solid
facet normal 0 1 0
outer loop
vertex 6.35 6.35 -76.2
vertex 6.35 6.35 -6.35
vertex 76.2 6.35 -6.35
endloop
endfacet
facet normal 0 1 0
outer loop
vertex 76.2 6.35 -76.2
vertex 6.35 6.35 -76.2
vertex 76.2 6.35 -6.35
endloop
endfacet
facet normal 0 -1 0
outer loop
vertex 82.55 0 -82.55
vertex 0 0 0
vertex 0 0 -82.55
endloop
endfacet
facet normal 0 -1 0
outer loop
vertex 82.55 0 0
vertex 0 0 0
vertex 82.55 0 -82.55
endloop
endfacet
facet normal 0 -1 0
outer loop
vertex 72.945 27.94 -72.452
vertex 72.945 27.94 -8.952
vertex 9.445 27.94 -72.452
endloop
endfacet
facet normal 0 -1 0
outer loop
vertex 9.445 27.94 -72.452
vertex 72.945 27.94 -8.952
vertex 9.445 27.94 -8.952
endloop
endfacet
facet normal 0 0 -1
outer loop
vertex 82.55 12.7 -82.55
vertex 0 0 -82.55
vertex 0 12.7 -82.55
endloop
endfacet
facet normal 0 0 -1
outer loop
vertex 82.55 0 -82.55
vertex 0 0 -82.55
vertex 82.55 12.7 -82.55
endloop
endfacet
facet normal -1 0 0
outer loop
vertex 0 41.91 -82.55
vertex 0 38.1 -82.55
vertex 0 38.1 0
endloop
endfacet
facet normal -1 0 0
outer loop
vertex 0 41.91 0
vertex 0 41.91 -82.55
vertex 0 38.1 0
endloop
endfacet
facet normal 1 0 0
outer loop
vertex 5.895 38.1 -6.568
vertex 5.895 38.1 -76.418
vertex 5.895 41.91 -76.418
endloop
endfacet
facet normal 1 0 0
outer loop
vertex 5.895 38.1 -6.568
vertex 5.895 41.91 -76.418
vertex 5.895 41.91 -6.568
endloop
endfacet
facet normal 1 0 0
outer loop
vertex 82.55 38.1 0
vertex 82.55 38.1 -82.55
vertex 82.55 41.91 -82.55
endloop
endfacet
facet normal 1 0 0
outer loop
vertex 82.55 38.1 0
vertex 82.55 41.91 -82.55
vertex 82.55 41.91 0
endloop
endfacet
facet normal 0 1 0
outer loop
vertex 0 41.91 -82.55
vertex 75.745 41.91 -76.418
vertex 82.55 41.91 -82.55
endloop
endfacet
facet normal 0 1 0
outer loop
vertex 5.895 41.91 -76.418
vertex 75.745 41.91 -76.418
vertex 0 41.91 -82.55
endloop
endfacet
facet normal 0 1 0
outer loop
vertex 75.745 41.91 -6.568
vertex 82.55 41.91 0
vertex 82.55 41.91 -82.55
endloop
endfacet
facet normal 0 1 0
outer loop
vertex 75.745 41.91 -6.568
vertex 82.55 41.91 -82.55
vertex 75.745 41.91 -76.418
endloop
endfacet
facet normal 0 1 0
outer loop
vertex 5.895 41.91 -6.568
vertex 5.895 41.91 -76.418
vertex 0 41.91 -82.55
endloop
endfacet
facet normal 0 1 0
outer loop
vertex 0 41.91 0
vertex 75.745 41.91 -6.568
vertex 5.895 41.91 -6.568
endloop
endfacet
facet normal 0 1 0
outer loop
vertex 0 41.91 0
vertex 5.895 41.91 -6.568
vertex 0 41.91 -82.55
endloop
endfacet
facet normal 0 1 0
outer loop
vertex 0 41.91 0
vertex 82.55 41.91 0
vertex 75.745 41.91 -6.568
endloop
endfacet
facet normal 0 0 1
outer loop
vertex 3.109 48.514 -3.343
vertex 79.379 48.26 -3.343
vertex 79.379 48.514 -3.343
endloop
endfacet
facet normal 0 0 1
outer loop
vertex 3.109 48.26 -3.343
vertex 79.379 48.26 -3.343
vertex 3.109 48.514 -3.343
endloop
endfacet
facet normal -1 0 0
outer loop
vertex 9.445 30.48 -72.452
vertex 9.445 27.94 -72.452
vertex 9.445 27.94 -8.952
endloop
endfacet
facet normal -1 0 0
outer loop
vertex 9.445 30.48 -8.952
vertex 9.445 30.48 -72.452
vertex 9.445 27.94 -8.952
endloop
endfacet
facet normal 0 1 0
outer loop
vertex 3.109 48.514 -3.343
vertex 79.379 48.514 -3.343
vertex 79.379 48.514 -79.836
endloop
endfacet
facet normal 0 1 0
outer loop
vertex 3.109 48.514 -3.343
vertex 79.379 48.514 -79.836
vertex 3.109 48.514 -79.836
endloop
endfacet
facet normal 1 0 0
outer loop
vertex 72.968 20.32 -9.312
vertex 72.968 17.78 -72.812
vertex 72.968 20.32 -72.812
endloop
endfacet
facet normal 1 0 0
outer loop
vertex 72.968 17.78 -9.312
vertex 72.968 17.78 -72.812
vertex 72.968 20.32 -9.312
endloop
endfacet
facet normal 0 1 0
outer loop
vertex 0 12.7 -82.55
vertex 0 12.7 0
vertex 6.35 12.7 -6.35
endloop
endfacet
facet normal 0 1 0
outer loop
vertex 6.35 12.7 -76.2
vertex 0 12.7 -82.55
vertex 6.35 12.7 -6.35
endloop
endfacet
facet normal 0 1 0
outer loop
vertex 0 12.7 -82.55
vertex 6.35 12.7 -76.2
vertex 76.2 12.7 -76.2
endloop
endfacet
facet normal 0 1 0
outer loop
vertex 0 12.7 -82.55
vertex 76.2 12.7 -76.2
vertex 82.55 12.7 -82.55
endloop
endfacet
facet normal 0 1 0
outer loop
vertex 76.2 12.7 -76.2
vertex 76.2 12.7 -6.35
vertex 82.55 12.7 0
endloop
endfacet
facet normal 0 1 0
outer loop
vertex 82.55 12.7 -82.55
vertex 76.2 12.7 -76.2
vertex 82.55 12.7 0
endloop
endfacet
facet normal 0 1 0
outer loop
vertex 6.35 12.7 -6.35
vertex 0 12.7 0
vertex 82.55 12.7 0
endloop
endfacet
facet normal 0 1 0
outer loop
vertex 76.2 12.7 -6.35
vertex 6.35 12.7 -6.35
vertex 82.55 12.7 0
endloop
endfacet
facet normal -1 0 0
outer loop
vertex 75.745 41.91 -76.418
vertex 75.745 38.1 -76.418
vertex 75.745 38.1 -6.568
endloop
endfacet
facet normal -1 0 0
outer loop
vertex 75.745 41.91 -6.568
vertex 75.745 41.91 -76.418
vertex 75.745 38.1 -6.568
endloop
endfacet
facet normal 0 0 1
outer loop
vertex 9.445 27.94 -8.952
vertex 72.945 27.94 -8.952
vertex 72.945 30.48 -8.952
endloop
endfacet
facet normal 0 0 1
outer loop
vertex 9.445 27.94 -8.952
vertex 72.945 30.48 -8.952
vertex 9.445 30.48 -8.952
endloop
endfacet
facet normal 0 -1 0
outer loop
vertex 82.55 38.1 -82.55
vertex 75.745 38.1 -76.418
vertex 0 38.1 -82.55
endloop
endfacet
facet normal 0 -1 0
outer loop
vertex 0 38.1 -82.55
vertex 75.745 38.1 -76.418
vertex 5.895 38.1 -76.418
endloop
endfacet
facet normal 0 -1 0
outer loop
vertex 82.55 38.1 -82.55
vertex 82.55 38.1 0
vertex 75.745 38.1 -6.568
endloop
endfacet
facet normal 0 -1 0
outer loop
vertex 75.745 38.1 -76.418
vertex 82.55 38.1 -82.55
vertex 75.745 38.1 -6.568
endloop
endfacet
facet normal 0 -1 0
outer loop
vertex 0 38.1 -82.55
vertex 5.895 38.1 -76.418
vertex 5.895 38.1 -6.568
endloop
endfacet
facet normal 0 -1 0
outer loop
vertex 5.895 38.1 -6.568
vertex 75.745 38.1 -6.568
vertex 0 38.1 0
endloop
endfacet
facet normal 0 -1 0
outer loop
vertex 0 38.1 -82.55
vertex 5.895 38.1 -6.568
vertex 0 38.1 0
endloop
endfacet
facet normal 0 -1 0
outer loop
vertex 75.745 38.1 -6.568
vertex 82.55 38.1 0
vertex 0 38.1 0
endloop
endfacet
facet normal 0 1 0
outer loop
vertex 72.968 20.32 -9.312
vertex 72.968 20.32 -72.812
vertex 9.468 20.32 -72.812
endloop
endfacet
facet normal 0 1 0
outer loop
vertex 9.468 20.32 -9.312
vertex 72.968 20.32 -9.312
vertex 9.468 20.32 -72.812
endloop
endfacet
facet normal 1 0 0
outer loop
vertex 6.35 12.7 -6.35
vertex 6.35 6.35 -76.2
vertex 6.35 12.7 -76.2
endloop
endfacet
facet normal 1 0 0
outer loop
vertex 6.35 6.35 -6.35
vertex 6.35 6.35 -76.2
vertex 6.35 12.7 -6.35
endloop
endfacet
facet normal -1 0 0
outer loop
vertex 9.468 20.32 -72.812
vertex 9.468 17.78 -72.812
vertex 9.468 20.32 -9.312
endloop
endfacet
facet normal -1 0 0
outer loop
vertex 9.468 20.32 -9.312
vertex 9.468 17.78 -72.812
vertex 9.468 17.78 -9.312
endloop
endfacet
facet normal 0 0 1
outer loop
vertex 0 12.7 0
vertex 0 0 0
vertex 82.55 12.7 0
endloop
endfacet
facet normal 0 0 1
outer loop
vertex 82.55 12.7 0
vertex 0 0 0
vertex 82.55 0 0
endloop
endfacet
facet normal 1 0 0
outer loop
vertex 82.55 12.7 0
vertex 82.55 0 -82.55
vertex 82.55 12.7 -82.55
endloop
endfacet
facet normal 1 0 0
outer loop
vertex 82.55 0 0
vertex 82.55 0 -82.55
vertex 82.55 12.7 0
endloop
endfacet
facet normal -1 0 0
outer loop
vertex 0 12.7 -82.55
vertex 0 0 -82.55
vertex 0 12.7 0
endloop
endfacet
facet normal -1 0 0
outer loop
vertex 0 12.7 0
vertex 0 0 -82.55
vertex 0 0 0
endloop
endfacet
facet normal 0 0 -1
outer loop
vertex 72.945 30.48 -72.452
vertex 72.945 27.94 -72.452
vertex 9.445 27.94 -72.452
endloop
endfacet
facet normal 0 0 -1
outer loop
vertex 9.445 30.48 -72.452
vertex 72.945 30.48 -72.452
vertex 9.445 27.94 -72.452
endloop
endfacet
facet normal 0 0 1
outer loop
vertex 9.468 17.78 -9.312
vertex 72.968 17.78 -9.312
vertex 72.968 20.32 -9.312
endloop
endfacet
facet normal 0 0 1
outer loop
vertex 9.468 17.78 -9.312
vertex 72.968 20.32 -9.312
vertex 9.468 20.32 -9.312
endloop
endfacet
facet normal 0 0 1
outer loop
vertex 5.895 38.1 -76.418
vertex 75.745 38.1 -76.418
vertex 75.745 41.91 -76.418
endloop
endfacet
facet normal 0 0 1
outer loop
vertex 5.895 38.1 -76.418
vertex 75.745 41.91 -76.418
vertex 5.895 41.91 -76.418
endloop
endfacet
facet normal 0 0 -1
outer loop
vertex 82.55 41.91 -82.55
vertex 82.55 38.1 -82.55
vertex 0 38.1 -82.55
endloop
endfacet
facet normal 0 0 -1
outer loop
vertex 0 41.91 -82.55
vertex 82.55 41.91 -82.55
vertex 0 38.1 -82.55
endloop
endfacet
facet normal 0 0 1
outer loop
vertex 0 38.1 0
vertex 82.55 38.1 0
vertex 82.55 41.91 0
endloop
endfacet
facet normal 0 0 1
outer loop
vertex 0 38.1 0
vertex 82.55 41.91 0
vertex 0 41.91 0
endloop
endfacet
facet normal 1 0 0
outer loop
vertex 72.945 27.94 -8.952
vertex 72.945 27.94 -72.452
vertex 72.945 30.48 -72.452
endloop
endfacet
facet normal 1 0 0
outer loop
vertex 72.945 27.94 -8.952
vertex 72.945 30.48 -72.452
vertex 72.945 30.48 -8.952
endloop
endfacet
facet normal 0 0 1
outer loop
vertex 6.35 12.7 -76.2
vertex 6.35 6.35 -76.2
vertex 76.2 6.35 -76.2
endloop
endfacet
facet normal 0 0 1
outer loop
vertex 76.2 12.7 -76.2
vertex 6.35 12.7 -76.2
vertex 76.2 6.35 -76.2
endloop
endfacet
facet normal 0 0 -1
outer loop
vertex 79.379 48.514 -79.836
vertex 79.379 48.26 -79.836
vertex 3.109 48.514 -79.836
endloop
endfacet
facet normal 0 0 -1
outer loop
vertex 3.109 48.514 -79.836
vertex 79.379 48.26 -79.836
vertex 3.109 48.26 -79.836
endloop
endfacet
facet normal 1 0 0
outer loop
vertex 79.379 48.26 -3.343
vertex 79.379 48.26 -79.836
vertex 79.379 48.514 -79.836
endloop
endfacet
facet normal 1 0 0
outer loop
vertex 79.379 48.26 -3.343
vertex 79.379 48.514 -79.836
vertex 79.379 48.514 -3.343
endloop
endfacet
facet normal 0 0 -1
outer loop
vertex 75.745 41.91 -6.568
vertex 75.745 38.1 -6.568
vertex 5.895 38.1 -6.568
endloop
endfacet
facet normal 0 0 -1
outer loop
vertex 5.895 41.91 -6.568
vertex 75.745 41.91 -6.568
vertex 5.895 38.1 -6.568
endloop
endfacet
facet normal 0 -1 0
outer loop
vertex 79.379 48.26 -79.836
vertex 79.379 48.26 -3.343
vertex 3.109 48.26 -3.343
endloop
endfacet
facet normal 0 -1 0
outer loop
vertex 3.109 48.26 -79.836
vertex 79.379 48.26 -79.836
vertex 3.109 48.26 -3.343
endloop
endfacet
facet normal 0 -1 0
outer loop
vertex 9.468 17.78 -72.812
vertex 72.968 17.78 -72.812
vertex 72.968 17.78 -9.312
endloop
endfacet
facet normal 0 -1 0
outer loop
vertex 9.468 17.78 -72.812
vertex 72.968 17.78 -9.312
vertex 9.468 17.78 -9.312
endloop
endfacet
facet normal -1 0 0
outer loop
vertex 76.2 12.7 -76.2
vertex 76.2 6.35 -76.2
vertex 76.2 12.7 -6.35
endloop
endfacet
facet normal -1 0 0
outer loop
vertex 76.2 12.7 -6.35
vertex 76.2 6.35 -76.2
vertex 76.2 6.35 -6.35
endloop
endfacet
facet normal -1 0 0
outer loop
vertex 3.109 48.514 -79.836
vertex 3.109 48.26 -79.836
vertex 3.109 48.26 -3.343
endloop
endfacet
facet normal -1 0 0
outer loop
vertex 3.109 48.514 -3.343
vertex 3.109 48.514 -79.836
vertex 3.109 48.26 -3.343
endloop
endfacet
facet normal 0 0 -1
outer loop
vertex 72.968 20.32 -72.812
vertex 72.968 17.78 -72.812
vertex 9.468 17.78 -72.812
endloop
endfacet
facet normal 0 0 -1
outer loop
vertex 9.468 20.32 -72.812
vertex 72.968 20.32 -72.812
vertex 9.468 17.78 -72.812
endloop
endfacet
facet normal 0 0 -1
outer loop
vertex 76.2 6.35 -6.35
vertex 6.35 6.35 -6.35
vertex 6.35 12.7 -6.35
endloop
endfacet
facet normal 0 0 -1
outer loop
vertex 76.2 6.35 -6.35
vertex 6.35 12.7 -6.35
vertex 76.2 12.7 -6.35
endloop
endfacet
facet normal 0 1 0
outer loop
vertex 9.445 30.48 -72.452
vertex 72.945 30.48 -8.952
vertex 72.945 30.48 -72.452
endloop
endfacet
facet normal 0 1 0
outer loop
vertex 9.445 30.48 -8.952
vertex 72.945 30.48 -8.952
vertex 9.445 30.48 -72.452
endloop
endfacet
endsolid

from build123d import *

# Parameters (mm, degrees)
F0_W      = 69.85
F0_H      = 69.85
F1_DEPTH  = 6.35
F0_W_2    = 82.55
F0_H_2    = 82.55
F2_DEPTH  = 12.7
F4_W      = 63.5
F4_H      = 63.5000017857
F5_DEPTH  = 2.54
F7_W      = 63.5
F7_H      = 63.5
F8_DEPTH  = 2.54
F10_W     = 82.55
F10_H     = 82.55
F10_W_2   = 69.85
F10_H_2   = 69.85
F11_DEPTH = 3.81
F13_W     = 76.2702370994
F13_H     = 76.493247645
F14_DEPTH = 0.254


with BuildPart() as f1:
    # F0 (on Front) → F1 (new body)
    with BuildSketch(Plane.XZ):
        with Locations((41.275, -41.275)):
            Rectangle(F0_W, F0_H)
    extrude(amount=-F1_DEPTH)

    # F0 (on Front) → F2 (join)
    with BuildSketch(Plane.XZ):
        with Locations((41.275, -41.275)):
            Rectangle(F0_W_2, F0_H_2)
        with Locations((41.275, -41.275)):
            Rectangle(F0_W, F0_H, mode=Mode.SUBTRACT)
    extrude(amount=-F2_DEPTH)


with BuildPart() as f5:
    # F4 (on offset) → F5 (new body)
    with BuildSketch(Plane(origin=(0, 17.78, 0), x_dir=(-1, 0, 0), z_dir=(0, 1, 0))):
        with Locations((-41.2176772952, -41.062287055)):
            Rectangle(F4_W, F4_H)
    extrude(amount=F5_DEPTH)


with BuildPart() as f8:
    # F7 (on offset) → F8 (new body)
    with BuildSketch(Plane(origin=(0, 27.94, 0), x_dir=(-1, 0, 0), z_dir=(0, 1, 0))):
        with Locations((-41.1946158856, -40.7015295091)):
            Rectangle(F7_W, F7_H)
    extrude(amount=F8_DEPTH)


with BuildPart() as f11:
    # F10 (on offset) → F11 (new body)
    with BuildSketch(Plane(origin=(0, 38.1, 0), x_dir=(-1, 0, 0), z_dir=(0, 1, 0))):
        with Locations((-41.275, -41.275)):
            Rectangle(F10_W, F10_H)
        with Locations((-40.8204782724, -41.492952776)):
            Rectangle(F10_W_2, F10_H_2, mode=Mode.SUBTRACT)
    extrude(amount=F11_DEPTH)


with BuildPart() as f14:
    # F13 (on offset) → F14 (new body)
    with BuildSketch(Plane(origin=(0, 48.26, 0), x_dir=(-1, 0, 0), z_dir=(0, 1, 0))):
        with Locations((-41.2437024061, -41.589305154)):
            Rectangle(F13_W, F13_H)
    extrude(amount=F14_DEPTH)


solid = Compound([f1.part, f5.part, f8.part, f11.part, f14.part])
